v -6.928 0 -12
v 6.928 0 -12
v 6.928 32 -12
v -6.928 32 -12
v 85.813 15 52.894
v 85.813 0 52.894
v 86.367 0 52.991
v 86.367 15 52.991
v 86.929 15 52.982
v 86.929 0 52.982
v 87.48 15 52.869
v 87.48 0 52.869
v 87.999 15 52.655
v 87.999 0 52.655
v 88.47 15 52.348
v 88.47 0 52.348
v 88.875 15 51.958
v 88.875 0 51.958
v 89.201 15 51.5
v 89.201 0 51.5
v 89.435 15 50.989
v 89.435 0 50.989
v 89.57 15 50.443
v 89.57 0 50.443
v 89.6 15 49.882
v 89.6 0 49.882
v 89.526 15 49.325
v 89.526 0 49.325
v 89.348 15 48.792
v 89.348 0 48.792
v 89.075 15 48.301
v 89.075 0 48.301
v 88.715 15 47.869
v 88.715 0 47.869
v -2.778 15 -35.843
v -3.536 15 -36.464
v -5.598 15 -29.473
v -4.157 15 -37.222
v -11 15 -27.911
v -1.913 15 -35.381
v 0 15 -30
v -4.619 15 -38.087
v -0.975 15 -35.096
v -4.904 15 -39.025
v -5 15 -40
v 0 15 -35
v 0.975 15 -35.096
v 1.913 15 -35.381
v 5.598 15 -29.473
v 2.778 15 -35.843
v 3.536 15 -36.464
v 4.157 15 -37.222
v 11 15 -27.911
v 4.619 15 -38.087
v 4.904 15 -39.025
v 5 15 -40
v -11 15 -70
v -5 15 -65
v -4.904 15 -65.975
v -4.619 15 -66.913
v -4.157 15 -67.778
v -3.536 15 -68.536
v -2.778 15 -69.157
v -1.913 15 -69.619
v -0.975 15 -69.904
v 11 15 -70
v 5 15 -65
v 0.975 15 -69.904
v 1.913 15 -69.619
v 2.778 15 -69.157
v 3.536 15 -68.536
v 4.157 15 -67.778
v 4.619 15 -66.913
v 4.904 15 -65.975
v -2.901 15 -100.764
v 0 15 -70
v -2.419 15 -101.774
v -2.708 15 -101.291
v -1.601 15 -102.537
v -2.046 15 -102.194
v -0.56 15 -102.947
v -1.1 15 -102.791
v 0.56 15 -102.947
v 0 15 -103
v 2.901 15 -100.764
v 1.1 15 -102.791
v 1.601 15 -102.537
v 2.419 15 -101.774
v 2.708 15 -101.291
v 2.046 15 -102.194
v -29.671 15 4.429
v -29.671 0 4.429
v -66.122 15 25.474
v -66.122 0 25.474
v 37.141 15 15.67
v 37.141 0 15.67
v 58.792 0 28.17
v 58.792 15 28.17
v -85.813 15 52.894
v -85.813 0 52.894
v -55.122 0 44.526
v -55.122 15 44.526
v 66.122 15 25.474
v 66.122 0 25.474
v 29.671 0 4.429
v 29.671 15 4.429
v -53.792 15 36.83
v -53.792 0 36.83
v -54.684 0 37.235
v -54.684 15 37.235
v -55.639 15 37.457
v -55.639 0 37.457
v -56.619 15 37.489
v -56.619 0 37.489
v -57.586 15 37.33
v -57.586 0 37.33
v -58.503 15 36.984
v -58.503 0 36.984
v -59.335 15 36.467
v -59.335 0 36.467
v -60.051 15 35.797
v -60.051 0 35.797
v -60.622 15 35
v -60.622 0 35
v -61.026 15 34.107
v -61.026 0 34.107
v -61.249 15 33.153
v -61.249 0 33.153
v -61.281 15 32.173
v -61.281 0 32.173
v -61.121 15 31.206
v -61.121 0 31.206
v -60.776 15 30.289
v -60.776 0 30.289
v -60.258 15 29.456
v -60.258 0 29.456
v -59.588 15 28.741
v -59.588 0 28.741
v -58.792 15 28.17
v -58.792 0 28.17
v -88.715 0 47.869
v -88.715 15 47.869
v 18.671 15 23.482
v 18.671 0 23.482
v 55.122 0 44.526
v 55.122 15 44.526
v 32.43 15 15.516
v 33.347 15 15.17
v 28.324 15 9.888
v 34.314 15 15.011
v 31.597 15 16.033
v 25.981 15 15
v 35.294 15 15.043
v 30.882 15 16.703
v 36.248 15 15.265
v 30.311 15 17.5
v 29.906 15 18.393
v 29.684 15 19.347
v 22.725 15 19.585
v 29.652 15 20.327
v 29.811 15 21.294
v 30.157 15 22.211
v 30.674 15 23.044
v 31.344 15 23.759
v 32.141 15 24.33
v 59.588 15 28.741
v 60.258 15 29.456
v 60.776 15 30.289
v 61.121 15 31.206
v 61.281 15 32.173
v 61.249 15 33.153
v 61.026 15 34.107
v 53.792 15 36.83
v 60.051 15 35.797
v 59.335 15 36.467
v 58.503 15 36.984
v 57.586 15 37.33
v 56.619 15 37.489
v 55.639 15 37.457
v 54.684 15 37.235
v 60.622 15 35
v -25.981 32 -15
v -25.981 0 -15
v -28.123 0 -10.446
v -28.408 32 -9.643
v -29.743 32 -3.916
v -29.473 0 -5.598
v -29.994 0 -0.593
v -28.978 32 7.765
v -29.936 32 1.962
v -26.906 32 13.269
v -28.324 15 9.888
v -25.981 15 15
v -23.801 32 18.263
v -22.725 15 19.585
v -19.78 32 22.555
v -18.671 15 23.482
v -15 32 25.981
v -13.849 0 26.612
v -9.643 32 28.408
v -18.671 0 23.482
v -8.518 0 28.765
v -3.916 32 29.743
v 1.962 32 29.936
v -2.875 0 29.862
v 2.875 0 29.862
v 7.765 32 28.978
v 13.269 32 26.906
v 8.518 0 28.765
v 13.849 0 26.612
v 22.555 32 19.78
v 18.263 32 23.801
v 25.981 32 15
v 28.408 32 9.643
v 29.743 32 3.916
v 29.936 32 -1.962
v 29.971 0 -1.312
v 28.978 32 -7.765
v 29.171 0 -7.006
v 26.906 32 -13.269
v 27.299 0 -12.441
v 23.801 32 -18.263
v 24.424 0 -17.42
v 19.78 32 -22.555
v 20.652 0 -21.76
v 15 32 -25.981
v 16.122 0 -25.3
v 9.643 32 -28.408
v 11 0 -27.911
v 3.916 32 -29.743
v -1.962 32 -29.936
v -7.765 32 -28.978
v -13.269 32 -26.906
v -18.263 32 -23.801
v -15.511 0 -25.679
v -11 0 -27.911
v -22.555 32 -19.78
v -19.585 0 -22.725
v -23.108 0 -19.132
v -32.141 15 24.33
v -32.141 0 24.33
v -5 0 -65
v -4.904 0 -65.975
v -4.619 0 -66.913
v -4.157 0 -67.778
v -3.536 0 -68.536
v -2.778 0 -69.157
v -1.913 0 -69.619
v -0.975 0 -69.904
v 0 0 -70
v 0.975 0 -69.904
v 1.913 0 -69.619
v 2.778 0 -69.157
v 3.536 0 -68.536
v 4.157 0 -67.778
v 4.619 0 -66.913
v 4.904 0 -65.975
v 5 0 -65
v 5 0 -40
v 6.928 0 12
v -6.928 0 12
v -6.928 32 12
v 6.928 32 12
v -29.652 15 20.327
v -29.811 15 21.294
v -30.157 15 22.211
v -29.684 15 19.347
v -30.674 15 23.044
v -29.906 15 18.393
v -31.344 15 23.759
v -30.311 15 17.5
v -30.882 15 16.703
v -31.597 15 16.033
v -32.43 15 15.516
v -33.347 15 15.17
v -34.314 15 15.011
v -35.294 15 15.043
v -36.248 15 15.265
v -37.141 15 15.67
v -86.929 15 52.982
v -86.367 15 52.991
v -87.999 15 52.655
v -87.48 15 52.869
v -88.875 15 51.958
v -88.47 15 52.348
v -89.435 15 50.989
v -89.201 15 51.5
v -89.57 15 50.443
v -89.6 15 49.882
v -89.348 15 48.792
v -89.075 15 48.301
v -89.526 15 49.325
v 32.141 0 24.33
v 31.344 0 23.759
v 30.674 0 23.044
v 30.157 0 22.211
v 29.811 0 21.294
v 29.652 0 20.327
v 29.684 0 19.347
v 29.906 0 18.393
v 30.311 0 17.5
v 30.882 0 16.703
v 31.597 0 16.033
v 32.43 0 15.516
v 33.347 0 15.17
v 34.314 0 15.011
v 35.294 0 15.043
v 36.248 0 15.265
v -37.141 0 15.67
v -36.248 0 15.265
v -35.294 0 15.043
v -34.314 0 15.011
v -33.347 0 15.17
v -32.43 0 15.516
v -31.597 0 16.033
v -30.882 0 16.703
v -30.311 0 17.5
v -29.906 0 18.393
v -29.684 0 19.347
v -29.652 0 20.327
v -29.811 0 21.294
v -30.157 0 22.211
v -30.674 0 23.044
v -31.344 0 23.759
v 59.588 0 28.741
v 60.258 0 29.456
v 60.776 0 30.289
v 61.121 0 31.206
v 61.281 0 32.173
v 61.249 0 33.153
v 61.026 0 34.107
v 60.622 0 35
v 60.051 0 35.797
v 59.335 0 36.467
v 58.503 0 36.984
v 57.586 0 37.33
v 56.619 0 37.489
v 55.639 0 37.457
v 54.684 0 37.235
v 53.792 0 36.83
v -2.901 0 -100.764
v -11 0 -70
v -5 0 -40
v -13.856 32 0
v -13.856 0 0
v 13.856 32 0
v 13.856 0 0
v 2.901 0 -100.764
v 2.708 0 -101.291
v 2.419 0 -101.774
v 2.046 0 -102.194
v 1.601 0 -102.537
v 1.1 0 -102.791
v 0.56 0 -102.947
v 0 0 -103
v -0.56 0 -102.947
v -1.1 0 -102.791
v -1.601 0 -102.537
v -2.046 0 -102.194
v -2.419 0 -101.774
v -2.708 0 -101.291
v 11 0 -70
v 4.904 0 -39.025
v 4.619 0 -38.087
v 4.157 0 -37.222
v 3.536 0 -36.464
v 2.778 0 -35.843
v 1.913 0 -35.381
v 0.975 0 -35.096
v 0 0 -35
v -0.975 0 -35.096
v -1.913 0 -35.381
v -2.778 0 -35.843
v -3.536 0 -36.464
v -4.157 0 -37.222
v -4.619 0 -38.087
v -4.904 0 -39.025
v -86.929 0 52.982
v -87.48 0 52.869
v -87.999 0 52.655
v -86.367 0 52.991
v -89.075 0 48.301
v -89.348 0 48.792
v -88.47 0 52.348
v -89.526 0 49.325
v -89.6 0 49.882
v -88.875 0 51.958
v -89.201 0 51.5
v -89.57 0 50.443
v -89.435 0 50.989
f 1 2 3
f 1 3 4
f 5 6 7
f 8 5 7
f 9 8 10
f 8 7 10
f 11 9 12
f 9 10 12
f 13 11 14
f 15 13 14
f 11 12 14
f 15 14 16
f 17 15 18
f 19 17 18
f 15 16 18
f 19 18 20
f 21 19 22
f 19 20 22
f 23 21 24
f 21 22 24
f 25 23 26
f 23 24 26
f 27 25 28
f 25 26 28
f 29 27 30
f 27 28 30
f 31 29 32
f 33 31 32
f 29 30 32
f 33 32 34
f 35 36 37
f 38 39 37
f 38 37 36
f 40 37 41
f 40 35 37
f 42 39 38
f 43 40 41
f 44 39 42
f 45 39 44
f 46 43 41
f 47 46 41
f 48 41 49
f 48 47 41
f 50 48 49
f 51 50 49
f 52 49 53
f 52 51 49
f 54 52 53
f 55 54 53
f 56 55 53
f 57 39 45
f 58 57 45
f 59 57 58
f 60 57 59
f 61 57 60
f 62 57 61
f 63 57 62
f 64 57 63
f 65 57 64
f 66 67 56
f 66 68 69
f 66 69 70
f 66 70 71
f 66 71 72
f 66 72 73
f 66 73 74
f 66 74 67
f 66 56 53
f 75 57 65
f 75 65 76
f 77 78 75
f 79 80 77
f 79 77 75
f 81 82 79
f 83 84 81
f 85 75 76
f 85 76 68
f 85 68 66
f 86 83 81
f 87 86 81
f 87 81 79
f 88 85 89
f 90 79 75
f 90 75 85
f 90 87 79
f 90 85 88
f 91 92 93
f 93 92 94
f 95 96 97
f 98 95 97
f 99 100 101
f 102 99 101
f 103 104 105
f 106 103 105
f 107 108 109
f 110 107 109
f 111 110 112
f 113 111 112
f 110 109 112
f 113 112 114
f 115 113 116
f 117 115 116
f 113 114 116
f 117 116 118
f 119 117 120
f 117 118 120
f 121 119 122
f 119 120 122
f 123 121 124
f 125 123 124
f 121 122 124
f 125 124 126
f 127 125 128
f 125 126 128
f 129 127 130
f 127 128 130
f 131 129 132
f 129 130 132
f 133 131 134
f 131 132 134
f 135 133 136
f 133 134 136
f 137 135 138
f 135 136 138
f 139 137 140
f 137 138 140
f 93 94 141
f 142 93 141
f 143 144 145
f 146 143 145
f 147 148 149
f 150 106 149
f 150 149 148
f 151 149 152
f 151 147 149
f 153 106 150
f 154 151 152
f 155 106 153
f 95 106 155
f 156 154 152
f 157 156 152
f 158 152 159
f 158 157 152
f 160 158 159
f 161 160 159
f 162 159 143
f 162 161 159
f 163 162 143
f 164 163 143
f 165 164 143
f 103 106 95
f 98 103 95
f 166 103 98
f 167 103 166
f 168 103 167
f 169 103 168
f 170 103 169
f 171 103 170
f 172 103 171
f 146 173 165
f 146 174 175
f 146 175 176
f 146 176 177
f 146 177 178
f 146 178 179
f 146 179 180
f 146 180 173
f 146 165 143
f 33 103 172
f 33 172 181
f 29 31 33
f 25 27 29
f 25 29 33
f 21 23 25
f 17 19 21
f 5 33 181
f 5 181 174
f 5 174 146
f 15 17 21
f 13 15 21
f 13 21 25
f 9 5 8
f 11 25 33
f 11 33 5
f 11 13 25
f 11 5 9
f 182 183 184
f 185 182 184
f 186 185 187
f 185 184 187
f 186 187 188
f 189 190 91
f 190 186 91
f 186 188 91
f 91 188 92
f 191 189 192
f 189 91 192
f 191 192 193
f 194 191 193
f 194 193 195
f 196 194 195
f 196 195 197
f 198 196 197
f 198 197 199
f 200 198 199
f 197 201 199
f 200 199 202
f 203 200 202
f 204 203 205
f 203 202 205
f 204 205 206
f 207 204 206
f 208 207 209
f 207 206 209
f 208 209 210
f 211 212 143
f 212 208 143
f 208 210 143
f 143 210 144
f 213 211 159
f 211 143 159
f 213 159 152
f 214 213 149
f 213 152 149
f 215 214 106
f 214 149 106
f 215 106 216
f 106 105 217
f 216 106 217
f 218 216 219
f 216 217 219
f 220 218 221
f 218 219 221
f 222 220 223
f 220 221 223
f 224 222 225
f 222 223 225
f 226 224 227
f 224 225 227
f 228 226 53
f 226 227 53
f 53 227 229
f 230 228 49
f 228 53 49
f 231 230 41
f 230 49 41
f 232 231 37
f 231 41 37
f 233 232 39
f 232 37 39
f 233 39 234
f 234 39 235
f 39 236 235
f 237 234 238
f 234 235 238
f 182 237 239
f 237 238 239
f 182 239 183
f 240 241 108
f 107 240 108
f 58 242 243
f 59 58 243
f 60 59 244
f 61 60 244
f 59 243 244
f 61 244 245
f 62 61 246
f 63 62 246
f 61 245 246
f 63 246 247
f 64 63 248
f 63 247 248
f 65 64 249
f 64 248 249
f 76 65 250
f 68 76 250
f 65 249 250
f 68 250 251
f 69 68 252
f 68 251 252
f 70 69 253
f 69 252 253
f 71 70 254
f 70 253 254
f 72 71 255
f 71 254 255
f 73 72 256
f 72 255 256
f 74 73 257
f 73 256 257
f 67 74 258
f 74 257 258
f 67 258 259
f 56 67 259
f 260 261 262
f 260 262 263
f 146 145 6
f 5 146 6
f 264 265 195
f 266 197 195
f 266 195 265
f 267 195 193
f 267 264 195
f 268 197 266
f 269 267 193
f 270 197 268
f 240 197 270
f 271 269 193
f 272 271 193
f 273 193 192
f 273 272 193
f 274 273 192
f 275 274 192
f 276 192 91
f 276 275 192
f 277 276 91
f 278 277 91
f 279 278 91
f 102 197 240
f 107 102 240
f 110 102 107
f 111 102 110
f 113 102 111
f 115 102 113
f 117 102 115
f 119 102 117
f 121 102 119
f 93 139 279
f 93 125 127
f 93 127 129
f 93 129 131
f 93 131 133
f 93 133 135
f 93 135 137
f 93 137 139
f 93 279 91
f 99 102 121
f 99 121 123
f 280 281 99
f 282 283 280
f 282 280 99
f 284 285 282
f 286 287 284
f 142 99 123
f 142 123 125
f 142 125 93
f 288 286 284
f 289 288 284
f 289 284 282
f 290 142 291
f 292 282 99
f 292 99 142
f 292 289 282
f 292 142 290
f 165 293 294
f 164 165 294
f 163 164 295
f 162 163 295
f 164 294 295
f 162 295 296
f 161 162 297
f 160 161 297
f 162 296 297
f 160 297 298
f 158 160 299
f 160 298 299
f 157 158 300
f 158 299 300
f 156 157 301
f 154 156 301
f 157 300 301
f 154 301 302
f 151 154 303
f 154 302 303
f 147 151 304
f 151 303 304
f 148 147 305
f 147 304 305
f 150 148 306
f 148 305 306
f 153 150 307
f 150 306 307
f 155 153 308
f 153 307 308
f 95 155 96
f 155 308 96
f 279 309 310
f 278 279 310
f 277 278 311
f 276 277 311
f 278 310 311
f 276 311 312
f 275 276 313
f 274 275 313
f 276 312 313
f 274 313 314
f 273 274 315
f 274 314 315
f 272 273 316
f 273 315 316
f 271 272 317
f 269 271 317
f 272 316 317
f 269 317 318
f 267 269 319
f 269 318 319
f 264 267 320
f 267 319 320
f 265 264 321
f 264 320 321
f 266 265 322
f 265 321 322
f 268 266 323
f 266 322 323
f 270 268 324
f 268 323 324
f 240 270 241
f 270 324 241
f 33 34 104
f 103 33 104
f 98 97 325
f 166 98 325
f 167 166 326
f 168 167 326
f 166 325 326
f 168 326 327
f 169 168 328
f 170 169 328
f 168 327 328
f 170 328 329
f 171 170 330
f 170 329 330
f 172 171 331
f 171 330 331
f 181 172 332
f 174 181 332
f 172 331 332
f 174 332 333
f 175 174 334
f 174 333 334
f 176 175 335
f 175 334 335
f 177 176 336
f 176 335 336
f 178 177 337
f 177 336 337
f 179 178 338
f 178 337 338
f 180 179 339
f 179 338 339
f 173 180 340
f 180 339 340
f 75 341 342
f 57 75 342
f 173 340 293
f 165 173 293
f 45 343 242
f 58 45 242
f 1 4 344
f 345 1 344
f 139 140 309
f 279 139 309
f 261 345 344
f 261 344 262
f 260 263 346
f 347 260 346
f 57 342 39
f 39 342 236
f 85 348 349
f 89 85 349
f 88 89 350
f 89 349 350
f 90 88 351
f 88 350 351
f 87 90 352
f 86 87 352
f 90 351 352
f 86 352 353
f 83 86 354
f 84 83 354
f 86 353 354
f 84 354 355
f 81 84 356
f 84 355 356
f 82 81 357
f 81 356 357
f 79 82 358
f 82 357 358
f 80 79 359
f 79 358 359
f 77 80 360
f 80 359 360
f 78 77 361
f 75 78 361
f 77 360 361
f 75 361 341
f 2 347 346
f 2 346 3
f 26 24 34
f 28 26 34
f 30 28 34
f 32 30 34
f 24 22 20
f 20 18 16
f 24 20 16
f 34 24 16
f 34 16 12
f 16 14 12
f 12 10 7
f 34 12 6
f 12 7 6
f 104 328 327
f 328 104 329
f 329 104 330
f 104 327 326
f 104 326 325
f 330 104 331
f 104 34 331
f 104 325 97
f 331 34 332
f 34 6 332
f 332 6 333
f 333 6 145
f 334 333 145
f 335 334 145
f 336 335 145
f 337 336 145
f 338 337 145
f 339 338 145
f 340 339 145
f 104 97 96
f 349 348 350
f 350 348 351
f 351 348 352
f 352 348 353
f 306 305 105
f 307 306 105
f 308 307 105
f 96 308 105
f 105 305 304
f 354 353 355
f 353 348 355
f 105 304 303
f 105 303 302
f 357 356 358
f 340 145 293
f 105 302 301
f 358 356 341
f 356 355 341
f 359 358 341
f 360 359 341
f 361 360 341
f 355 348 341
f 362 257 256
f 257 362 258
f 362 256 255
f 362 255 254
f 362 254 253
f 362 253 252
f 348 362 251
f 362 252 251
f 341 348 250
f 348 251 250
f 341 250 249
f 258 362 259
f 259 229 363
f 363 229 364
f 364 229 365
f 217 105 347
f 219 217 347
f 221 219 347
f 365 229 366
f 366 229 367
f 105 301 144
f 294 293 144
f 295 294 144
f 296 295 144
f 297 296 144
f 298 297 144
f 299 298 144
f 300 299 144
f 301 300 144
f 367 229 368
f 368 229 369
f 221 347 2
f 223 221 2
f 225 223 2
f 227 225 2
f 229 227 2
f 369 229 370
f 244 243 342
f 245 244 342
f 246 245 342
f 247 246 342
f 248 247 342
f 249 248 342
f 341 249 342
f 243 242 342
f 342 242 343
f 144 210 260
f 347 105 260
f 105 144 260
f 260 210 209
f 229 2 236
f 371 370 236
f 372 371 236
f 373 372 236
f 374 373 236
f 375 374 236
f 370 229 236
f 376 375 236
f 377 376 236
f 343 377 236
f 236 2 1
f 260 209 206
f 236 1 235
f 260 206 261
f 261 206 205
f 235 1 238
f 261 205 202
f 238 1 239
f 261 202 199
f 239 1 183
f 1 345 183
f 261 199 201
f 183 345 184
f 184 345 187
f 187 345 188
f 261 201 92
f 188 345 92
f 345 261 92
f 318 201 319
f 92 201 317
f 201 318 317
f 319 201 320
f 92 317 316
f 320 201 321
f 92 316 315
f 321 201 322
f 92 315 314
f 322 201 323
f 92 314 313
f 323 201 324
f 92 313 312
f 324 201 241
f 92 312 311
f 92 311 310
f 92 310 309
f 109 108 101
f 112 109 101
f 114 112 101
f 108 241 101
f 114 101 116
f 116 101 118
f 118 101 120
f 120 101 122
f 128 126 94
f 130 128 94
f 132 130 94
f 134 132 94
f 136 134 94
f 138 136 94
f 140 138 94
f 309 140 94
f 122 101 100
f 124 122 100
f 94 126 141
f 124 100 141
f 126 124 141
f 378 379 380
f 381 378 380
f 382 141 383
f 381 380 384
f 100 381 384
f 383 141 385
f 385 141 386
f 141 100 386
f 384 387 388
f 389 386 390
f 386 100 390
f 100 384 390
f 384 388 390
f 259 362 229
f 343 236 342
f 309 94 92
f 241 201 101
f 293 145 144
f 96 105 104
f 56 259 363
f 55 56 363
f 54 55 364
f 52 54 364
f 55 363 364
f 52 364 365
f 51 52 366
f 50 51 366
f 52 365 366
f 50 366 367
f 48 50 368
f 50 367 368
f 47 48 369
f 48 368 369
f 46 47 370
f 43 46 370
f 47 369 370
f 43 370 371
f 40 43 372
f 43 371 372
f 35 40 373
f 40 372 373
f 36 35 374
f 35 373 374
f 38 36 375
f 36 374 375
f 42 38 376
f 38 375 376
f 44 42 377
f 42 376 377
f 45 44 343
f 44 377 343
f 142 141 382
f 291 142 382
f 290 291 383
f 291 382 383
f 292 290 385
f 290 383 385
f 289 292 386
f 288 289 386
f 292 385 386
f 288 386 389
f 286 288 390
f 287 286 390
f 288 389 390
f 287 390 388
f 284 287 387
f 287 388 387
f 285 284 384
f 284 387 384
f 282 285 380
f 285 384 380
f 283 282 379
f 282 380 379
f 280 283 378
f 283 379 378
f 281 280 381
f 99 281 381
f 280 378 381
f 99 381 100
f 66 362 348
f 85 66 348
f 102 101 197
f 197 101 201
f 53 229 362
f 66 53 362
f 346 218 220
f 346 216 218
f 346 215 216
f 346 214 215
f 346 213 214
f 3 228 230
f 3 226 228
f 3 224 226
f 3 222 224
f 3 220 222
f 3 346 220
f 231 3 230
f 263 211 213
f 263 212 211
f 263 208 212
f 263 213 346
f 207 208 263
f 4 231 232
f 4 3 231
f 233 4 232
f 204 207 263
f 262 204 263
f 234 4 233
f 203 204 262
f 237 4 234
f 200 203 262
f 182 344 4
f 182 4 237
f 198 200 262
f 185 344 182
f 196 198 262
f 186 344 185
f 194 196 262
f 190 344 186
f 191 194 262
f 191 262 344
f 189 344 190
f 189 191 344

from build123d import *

# Parameters (mm, degrees)
SKETCH1_R           = 30
BOSS_EXTRUDE1_DEPTH = 32
BOSS_EXTRUDE2_DEPTH = 15
CIRPATTERN2_COUNT   = 3


with BuildPart() as part:
    # Sketch1 → Boss-Extrude1 (new body)
    with BuildSketch(Plane(origin=(0, 0, 0), x_dir=(1, 0, 0), z_dir=(0, 1, 0))):
        with Locations(Location((0, 0, 0), (0, 0, 270))):
            Circle(SKETCH1_R)
        Polygon((6.92820323, -12), (13.856406461, 0), (6.92820323, 12), (-6.92820323, 12), (-13.856406461, 0), (-6.92820323, -12), align=None, mode=Mode.SUBTRACT)
    extrude(amount=BOSS_EXTRUDE1_DEPTH)

    # Sketch1<3> → Boss-Extrude2 (add)
    with BuildSketch(Plane(origin=(0, 0, 0), x_dir=(1, 0, 0), z_dir=(0, 1, 0))):
        with BuildLine():
            Line((11, 27.910571474), (11, 70))
            Line((11, 70), (2.901151097, 100.763755402))
            ThreePointArc((2.901151097, 100.763755402), (0, 103), (-2.901151097, 100.763755402))
            Line((-2.901151097, 100.763755402), (-11, 70))
            Line((-11, 70), (-11, 27.910571474))
            ThreePointArc((-11, 27.910571474), (0, 30), (11, 27.910571474))
        make_face()
        with BuildLine():
            ThreePointArc((5, 40), (0, 35), (-5, 40))
            Line((-5, 40), (-5, 65))
            ThreePointArc((-5, 65), (0, 70), (5, 65))
            Line((5, 65), (5, 40))
        make_face(mode=Mode.SUBTRACT)
    extrude(amount=BOSS_EXTRUDE2_DEPTH)


with BuildPart() as cirpattern2_1:
    # CirPattern2: pattern copy
    add(part.part.rotate(Axis((0, 0, 0), (0, 1, 0)), 1 * 360 / CIRPATTERN2_COUNT))


with BuildPart() as cirpattern2_2:
    # CirPattern2: pattern copy
    add(part.part.rotate(Axis((0, 0, 0), (0, 1, 0)), 2 * 360 / CIRPATTERN2_COUNT))

    # Combine2: read off the stored shape, not the designer's step
    # Combine2: union part, CirPattern2_1
    add(part.part)
    add(cirpattern2_1.part)


solid = cirpattern2_2.part
